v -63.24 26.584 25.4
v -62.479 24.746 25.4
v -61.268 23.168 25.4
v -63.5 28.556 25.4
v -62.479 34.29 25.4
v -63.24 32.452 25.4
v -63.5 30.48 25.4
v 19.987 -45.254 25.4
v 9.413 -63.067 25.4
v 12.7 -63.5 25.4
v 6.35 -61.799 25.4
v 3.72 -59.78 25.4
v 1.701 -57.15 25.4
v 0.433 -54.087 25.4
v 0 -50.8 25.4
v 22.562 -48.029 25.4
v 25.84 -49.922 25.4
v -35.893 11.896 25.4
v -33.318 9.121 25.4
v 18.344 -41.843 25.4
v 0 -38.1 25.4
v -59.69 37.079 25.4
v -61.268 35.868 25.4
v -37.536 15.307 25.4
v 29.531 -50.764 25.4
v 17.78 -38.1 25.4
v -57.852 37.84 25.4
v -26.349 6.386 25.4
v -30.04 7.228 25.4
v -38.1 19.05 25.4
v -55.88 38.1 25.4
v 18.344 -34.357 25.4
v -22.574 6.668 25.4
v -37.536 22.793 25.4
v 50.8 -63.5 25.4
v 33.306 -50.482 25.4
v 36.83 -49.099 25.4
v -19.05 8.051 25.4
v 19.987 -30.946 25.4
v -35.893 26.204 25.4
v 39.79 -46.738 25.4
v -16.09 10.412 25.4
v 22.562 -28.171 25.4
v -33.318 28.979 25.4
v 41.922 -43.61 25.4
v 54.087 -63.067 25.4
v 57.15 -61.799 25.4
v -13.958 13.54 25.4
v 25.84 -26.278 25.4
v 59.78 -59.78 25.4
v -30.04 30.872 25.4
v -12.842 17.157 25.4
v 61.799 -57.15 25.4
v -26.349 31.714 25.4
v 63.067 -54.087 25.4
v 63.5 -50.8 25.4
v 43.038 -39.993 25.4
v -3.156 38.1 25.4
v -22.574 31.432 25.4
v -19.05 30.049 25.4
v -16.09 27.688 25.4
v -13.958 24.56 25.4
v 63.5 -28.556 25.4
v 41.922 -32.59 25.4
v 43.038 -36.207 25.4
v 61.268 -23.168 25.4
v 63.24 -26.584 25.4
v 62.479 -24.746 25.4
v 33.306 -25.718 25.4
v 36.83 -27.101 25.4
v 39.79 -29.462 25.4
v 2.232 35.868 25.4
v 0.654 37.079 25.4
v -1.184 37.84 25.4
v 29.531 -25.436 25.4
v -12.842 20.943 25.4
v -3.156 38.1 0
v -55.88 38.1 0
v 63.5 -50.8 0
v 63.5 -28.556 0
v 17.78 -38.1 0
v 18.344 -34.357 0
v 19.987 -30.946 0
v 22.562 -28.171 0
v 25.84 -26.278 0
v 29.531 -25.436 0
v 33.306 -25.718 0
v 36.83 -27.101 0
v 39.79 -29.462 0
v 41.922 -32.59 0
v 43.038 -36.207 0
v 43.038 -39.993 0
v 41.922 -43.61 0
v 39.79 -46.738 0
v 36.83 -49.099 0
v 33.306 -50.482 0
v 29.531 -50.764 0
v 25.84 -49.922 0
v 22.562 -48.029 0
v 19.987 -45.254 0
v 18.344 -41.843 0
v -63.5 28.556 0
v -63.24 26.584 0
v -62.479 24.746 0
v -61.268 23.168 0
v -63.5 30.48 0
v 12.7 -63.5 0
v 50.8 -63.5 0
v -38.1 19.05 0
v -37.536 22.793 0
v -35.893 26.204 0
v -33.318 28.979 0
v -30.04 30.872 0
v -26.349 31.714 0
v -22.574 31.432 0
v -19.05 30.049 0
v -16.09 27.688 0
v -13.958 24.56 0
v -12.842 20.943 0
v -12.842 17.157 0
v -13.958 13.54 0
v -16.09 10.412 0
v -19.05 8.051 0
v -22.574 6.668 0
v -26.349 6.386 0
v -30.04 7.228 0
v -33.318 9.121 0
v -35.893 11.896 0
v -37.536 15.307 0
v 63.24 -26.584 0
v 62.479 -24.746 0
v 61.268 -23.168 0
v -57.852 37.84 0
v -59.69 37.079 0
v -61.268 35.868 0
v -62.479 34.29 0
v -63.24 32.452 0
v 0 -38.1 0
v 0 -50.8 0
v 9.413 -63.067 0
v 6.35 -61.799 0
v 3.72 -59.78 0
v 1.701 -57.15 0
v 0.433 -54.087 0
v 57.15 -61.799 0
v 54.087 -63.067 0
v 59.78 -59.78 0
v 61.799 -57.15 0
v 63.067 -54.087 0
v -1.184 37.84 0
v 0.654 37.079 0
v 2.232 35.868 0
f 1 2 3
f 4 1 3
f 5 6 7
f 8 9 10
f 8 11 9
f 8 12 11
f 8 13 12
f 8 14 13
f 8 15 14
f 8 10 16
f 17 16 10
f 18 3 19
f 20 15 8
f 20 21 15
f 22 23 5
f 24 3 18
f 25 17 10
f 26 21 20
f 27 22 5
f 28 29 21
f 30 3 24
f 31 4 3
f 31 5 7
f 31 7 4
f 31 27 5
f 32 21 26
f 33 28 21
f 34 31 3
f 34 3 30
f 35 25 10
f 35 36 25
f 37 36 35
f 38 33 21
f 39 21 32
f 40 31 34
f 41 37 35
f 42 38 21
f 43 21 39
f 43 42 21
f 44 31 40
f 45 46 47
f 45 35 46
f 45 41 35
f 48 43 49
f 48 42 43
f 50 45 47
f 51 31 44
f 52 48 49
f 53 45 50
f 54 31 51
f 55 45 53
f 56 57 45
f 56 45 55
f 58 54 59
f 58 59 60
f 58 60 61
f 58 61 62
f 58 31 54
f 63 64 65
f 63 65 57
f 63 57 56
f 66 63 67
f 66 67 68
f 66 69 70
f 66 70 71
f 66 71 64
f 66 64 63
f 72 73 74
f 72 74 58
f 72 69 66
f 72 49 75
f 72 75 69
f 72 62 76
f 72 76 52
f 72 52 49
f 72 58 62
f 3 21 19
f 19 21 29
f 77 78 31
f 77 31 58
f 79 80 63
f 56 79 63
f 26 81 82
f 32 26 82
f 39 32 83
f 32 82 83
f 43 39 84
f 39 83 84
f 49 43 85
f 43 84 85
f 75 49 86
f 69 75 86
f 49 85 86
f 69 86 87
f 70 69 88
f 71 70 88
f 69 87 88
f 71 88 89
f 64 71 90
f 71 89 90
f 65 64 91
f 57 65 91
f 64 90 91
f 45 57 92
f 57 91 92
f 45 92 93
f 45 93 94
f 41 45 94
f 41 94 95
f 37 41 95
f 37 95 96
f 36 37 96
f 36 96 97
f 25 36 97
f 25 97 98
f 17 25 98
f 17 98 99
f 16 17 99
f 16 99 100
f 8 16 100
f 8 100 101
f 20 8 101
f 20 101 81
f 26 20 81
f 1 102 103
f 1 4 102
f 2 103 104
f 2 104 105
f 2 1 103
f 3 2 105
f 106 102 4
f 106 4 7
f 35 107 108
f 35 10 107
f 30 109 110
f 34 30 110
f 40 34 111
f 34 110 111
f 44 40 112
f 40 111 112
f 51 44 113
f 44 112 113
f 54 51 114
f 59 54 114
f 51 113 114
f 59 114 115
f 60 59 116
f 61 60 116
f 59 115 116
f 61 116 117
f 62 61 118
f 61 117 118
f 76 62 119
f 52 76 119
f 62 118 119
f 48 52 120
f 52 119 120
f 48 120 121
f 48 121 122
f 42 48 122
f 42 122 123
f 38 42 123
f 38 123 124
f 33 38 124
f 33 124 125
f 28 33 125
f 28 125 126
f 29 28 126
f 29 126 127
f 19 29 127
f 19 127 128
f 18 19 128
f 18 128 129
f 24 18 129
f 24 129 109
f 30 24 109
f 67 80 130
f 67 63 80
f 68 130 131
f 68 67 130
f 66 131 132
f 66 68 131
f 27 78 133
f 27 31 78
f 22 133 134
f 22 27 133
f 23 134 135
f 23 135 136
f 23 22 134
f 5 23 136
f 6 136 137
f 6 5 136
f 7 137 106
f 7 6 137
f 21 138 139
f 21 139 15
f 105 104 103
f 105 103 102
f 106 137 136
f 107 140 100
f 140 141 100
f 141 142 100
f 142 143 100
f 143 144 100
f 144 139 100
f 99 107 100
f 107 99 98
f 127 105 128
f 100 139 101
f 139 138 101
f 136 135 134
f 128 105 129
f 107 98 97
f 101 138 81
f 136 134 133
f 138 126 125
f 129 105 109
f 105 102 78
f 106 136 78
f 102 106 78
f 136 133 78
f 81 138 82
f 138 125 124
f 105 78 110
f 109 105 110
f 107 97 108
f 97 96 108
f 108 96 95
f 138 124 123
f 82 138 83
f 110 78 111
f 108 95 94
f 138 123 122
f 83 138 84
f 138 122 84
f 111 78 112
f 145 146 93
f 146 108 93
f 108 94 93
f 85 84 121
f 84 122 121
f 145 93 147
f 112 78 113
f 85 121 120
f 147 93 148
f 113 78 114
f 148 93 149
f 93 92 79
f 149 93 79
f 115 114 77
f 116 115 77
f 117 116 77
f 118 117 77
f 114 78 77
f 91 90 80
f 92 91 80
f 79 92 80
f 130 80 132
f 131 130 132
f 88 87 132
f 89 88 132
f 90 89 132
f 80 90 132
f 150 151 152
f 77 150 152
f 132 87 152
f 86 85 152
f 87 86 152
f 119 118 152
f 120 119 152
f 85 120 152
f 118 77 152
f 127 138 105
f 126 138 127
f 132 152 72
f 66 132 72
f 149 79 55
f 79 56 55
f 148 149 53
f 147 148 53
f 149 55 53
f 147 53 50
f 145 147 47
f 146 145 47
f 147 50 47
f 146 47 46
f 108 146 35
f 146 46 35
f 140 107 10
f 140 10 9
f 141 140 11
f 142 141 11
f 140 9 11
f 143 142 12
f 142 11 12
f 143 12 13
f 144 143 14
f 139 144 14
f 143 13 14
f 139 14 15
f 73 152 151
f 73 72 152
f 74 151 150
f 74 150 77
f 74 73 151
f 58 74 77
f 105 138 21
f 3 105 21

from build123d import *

# Parameters (mm, degrees)
F0_W     = 127
F0_H     = 76.2
F1_DEPTH = 25.4
F2_SIZE  = 63.5
F3_W     = 63.5
F3_H     = 25.4
F4_DEPTH = 25.4
F5_SIZE  = 63.5
F6_R     = 12.7
F7_R     = 7.62
F9_D     = 25.4
F11_D    = 25.4


with BuildPart() as f1:
    # F0 (on Top) → F1 (new body)
    with BuildSketch(Plane.XY):
        Rectangle(F0_W, F0_H)
    extrude(amount=F1_DEPTH)

    # F2
    f2_edges = [f1.edges().sort_by_distance(p)[0] for p in [
        (-63.5, -38.1, 12.7),
    ]]
    chamfer(f2_edges, length=F2_SIZE)

    # F3 (on face) → F4 (join)
    with BuildSketch(Plane.XZ.offset(38.1)):
        with Locations((31.75, 12.7)):
            Rectangle(F3_W, F3_H)
    extrude(amount=F4_DEPTH)

    # F5
    f5_edges = [f1.edges().sort_by_distance(p)[0] for p in [
        (63.5, 38.1, 12.7),
    ]]
    chamfer(f5_edges, length=F5_SIZE)

    # F6
    f6_edges = [f1.edges().sort_by_distance(p)[0] for p in [
        (63.5, -63.5, 12.7),
        (0, -63.5, 12.7),
    ]]
    fillet(f6_edges, radius=F6_R)

    # F7
    f7_edges = [f1.edges().sort_by_distance(p)[0] for p in [
        (-63.5, 25.4, 12.7),
        (-63.5, 38.1, 12.7),
        (0, 38.1, 12.7),
        (63.5, -25.4, 12.7),
    ]]
    fillet(f7_edges, radius=F7_R)

    # F9 (through all)
    with Locations(Plane.XY.offset(25.4)):
        with Locations((30.48, -38.1)):
            Hole(F9_D / 2)

    # F11 (through all)
    with Locations(Plane.XY.offset(25.4)):
        with Locations((-25.4, 19.05)):
            Hole(F11_D / 2)


solid = f1.part
